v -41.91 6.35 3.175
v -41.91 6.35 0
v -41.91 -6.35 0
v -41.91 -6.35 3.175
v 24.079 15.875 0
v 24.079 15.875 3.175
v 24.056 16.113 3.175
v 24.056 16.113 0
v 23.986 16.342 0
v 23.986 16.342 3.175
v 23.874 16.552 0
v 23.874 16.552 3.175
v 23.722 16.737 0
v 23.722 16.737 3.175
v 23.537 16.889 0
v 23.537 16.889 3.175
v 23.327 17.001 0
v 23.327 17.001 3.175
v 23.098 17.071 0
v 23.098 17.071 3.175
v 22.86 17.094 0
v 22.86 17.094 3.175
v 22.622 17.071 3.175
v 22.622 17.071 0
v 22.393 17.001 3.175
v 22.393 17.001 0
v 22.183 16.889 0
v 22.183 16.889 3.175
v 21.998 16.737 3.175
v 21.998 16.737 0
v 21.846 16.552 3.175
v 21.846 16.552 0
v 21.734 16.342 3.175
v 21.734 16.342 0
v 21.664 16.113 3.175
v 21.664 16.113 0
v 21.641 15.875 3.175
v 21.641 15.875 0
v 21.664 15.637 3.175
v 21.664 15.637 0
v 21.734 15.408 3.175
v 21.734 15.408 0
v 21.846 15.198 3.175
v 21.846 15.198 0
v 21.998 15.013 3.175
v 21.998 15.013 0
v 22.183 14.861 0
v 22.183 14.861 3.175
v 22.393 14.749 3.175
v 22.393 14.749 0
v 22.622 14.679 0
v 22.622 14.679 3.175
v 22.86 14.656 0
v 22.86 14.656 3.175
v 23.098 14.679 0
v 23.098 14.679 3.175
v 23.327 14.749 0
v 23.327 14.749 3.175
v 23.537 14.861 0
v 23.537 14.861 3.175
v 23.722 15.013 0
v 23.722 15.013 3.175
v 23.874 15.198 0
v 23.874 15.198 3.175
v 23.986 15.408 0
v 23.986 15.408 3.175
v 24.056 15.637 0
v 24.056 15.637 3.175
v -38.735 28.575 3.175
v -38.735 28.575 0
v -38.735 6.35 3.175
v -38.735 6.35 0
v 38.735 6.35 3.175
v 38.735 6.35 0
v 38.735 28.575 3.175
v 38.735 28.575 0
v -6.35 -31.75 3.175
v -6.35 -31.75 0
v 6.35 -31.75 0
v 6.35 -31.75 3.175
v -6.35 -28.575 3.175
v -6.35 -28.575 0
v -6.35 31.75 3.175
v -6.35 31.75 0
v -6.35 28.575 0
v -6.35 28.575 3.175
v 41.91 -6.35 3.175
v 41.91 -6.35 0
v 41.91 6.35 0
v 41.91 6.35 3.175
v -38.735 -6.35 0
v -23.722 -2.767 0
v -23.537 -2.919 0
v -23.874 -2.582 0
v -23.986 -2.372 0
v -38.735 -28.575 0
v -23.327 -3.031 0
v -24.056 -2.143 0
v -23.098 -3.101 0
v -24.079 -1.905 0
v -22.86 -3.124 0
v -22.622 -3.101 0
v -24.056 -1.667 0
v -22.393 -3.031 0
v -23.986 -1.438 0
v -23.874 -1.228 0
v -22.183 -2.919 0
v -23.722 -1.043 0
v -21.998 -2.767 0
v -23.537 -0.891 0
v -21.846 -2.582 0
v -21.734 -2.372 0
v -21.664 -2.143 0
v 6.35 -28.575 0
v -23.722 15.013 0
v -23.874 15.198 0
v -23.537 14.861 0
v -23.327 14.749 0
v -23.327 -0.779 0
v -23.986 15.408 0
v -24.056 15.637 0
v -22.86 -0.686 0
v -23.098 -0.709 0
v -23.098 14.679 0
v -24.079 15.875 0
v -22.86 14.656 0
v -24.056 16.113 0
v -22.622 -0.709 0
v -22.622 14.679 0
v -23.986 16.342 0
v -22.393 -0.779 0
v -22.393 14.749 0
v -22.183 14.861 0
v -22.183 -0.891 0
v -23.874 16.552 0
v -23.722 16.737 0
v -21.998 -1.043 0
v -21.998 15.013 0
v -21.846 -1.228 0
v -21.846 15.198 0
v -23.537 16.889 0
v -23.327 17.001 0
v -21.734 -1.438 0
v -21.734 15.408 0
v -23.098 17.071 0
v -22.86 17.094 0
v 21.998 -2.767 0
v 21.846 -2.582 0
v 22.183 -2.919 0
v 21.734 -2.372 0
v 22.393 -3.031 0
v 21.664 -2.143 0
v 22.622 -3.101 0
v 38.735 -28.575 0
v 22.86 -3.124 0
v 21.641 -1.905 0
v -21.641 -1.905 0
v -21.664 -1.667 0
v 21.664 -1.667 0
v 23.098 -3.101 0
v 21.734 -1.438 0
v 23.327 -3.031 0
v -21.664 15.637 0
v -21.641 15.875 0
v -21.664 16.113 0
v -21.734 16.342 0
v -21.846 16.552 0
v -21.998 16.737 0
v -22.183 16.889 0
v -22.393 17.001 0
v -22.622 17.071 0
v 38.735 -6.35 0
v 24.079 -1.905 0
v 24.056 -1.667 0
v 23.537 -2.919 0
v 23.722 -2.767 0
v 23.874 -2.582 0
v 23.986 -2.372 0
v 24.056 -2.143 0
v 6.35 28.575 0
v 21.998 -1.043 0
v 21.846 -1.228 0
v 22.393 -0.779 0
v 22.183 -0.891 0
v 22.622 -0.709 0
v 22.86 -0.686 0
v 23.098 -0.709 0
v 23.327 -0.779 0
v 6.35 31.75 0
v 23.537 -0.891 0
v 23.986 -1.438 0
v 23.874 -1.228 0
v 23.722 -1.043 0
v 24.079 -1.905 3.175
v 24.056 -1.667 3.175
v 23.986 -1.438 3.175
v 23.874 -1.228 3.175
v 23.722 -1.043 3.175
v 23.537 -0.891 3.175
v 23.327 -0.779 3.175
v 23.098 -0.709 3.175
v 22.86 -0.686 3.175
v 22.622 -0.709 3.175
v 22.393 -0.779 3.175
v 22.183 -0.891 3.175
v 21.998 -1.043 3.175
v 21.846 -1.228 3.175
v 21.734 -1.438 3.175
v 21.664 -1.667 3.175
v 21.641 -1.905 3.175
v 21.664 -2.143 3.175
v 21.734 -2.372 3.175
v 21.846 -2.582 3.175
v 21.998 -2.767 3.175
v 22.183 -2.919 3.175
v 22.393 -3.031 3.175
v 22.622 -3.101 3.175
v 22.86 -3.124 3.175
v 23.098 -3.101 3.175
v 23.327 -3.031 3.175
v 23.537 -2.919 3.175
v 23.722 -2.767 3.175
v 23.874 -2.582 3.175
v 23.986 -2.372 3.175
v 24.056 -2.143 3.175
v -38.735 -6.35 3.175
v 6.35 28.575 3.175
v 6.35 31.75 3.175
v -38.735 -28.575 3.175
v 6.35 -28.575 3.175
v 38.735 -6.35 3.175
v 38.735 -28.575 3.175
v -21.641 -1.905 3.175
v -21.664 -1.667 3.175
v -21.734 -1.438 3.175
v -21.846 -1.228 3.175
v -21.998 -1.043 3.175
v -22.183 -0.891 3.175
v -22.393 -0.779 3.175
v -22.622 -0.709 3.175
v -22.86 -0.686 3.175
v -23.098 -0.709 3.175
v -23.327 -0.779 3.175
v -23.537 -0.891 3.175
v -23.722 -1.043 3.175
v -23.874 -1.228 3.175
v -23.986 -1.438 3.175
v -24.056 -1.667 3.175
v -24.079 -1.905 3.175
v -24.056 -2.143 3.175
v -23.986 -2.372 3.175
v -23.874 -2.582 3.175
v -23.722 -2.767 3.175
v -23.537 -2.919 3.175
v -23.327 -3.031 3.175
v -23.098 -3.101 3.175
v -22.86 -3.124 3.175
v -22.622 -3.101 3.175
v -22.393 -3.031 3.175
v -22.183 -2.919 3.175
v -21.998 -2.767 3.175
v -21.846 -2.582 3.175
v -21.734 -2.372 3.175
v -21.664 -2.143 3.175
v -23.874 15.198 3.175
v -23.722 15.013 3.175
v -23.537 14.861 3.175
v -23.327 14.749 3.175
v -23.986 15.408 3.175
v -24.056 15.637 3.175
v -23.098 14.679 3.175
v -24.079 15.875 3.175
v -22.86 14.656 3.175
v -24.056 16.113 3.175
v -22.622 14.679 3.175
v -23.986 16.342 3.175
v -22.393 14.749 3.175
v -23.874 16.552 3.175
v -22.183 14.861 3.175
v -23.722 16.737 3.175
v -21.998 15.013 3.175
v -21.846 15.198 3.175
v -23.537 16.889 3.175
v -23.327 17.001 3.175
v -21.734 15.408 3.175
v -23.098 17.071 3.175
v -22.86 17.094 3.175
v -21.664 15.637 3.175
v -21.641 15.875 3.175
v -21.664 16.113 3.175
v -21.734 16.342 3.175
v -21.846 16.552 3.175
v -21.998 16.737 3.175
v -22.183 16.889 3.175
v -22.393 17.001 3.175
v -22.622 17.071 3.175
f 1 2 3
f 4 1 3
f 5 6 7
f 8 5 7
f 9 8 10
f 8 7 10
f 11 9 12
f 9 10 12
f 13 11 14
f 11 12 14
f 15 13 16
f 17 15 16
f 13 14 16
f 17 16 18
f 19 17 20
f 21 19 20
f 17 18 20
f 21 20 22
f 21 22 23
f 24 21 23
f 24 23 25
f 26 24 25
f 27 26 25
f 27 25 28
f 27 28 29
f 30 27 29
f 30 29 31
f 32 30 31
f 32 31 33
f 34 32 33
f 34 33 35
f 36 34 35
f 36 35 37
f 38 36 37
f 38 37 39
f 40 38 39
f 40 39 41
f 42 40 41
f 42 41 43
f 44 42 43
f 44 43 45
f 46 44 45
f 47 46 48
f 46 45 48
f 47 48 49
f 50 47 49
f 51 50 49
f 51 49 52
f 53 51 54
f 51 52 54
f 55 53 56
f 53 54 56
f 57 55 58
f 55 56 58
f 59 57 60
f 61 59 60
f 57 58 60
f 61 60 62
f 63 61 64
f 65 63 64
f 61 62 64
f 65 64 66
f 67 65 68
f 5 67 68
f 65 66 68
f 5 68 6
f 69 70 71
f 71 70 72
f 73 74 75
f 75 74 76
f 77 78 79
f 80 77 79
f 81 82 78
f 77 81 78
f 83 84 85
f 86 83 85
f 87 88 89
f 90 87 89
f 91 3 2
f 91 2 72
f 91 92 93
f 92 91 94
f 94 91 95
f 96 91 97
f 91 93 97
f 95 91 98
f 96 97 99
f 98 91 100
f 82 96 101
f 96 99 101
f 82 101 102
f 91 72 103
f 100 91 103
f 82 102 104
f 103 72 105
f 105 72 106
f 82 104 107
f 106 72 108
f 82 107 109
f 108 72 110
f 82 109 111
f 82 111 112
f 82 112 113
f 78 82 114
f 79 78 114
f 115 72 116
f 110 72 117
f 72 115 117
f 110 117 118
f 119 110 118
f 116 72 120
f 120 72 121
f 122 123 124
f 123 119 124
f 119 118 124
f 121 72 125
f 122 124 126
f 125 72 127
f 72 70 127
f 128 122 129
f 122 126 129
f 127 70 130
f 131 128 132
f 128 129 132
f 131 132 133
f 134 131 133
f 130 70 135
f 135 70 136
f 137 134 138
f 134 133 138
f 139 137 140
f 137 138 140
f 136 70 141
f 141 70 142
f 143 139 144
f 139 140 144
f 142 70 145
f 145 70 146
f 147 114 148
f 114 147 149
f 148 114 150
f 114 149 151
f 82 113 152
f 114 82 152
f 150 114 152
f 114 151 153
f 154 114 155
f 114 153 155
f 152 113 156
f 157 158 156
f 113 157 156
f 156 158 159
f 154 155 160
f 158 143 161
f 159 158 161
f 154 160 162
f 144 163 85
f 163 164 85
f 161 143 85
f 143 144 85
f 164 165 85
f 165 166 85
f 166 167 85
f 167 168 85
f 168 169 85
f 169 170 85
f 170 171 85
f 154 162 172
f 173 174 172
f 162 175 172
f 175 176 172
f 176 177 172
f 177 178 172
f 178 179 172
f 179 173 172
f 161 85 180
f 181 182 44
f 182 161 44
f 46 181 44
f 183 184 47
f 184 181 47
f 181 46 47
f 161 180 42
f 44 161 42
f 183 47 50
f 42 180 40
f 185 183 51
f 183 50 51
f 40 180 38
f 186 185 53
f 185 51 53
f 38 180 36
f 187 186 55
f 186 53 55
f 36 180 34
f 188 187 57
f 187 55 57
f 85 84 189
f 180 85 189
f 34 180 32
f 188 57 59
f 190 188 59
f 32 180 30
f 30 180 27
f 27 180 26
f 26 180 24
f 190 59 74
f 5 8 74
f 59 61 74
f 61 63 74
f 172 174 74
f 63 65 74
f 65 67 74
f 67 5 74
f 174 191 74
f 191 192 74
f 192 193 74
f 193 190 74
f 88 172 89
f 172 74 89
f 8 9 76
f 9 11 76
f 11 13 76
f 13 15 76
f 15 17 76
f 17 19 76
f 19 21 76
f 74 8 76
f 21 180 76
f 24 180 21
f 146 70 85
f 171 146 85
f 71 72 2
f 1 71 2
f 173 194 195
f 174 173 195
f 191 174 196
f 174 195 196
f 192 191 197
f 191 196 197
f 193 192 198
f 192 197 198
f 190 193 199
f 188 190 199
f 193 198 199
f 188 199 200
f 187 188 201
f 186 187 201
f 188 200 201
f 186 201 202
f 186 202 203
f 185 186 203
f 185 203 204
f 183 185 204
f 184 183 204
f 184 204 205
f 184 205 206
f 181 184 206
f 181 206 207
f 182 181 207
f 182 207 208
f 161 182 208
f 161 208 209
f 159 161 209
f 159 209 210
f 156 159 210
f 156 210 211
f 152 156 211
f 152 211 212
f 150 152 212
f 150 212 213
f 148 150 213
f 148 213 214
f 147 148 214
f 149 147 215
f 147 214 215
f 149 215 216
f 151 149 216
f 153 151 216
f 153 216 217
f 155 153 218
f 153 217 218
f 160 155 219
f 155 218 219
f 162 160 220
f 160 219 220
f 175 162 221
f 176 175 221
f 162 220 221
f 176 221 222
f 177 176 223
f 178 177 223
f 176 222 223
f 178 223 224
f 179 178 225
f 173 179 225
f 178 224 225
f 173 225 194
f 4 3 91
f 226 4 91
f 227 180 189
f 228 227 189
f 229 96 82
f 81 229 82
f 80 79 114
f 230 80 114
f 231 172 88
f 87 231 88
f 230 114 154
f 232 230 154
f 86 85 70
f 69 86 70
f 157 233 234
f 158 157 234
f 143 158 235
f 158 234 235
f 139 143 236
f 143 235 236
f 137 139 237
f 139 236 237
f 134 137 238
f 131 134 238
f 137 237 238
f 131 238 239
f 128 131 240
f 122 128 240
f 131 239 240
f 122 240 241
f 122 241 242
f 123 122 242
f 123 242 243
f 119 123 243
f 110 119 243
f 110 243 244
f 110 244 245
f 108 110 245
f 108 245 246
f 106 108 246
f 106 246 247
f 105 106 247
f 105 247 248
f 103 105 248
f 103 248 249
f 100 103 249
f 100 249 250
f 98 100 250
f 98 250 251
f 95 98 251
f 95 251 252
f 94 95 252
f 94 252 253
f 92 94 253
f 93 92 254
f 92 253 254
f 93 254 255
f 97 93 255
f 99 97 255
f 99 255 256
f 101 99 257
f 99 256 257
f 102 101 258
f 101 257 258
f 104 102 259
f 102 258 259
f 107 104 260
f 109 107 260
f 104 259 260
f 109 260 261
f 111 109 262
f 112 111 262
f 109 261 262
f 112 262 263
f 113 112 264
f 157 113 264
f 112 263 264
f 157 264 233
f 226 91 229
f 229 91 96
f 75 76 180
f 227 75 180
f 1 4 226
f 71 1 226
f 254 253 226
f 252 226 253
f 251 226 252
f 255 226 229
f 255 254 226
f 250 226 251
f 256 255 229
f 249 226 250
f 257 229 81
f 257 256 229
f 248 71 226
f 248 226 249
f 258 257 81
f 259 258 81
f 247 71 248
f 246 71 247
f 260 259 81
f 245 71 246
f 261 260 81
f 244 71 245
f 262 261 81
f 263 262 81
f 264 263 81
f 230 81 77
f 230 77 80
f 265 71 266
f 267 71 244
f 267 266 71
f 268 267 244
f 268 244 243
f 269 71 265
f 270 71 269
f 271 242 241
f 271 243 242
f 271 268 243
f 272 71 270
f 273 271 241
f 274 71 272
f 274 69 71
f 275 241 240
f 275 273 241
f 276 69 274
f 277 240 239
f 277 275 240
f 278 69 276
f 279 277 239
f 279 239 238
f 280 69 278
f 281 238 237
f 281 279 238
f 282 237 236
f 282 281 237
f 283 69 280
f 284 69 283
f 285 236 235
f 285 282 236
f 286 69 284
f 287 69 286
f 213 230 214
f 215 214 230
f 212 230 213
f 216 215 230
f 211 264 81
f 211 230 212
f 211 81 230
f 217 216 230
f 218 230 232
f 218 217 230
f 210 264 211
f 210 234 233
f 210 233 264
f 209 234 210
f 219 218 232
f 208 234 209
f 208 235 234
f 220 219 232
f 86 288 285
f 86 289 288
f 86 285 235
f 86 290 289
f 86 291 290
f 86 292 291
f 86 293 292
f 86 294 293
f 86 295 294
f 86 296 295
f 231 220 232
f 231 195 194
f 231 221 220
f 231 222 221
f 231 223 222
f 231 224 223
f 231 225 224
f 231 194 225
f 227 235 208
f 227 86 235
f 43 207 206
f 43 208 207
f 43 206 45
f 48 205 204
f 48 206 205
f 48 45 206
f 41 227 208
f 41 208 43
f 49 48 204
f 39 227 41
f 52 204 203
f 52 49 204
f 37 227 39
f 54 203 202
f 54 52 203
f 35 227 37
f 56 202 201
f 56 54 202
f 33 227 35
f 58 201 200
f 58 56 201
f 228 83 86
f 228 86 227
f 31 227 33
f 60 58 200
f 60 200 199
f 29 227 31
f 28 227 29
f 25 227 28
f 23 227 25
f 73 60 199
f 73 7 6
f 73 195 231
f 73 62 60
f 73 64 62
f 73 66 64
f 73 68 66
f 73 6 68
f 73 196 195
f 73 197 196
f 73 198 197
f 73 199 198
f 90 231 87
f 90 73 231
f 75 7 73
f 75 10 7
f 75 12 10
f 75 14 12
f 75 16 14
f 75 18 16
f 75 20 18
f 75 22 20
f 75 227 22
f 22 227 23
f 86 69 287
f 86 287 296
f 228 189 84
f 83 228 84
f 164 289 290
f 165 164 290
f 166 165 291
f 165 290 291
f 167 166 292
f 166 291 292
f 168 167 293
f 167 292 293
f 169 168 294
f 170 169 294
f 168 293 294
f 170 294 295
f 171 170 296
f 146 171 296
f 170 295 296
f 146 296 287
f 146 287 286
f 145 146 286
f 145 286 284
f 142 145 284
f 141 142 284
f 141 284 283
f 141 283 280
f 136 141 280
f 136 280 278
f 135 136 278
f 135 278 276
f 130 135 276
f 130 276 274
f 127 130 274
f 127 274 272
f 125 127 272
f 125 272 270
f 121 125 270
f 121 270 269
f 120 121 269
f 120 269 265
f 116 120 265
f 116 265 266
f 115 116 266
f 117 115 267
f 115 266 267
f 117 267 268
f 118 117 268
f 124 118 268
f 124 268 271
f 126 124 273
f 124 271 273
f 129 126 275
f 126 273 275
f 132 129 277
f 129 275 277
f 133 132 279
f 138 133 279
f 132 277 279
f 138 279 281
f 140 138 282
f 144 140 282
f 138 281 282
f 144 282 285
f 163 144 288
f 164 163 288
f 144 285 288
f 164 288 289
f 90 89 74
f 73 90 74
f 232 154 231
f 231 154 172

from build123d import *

# Parameters (mm, degrees)
BOSS_EXTRUDE1_DEPTH = 3.175
SKETCH2_R           = 1.2192
CUT_EXTRUDE1_DEPTH  = 4.175


with BuildPart() as part:
    # Sketch1 → Boss-Extrude1 (new body)
    with BuildSketch(Plane.XY):
        Polygon((-38.735, 6.35), (-41.91, 6.35), (-41.91, -6.35), (-38.735, -6.35), (-38.735, -28.575), (-6.35, -28.575), (-6.35, -31.75), (6.35, -31.75), (6.35, -28.575), (38.735, -28.575), (38.735, -6.35), (41.91, -6.35), (41.91, 6.35), (38.735, 6.35), (38.735, 28.575), (6.35, 28.575), (6.35, 31.75), (-6.35, 31.75), (-6.35, 28.575), (-38.735, 28.575), align=None)
    extrude(amount=BOSS_EXTRUDE1_DEPTH)

    # Sketch2 → Cut-Extrude1 (cut, through all)
    with BuildSketch(Plane.XY.offset(3.175)):
        with Locations((-22.86, 15.875)):
            Circle(SKETCH2_R)
        with Locations((22.86, 15.875)):
            Circle(SKETCH2_R)
        with Locations((22.86, -1.905)):
            Circle(SKETCH2_R)
        with Locations((-22.86, -1.905)):
            Circle(SKETCH2_R)
    extrude(amount=-CUT_EXTRUDE1_DEPTH, mode=Mode.SUBTRACT)


solid = part.part
